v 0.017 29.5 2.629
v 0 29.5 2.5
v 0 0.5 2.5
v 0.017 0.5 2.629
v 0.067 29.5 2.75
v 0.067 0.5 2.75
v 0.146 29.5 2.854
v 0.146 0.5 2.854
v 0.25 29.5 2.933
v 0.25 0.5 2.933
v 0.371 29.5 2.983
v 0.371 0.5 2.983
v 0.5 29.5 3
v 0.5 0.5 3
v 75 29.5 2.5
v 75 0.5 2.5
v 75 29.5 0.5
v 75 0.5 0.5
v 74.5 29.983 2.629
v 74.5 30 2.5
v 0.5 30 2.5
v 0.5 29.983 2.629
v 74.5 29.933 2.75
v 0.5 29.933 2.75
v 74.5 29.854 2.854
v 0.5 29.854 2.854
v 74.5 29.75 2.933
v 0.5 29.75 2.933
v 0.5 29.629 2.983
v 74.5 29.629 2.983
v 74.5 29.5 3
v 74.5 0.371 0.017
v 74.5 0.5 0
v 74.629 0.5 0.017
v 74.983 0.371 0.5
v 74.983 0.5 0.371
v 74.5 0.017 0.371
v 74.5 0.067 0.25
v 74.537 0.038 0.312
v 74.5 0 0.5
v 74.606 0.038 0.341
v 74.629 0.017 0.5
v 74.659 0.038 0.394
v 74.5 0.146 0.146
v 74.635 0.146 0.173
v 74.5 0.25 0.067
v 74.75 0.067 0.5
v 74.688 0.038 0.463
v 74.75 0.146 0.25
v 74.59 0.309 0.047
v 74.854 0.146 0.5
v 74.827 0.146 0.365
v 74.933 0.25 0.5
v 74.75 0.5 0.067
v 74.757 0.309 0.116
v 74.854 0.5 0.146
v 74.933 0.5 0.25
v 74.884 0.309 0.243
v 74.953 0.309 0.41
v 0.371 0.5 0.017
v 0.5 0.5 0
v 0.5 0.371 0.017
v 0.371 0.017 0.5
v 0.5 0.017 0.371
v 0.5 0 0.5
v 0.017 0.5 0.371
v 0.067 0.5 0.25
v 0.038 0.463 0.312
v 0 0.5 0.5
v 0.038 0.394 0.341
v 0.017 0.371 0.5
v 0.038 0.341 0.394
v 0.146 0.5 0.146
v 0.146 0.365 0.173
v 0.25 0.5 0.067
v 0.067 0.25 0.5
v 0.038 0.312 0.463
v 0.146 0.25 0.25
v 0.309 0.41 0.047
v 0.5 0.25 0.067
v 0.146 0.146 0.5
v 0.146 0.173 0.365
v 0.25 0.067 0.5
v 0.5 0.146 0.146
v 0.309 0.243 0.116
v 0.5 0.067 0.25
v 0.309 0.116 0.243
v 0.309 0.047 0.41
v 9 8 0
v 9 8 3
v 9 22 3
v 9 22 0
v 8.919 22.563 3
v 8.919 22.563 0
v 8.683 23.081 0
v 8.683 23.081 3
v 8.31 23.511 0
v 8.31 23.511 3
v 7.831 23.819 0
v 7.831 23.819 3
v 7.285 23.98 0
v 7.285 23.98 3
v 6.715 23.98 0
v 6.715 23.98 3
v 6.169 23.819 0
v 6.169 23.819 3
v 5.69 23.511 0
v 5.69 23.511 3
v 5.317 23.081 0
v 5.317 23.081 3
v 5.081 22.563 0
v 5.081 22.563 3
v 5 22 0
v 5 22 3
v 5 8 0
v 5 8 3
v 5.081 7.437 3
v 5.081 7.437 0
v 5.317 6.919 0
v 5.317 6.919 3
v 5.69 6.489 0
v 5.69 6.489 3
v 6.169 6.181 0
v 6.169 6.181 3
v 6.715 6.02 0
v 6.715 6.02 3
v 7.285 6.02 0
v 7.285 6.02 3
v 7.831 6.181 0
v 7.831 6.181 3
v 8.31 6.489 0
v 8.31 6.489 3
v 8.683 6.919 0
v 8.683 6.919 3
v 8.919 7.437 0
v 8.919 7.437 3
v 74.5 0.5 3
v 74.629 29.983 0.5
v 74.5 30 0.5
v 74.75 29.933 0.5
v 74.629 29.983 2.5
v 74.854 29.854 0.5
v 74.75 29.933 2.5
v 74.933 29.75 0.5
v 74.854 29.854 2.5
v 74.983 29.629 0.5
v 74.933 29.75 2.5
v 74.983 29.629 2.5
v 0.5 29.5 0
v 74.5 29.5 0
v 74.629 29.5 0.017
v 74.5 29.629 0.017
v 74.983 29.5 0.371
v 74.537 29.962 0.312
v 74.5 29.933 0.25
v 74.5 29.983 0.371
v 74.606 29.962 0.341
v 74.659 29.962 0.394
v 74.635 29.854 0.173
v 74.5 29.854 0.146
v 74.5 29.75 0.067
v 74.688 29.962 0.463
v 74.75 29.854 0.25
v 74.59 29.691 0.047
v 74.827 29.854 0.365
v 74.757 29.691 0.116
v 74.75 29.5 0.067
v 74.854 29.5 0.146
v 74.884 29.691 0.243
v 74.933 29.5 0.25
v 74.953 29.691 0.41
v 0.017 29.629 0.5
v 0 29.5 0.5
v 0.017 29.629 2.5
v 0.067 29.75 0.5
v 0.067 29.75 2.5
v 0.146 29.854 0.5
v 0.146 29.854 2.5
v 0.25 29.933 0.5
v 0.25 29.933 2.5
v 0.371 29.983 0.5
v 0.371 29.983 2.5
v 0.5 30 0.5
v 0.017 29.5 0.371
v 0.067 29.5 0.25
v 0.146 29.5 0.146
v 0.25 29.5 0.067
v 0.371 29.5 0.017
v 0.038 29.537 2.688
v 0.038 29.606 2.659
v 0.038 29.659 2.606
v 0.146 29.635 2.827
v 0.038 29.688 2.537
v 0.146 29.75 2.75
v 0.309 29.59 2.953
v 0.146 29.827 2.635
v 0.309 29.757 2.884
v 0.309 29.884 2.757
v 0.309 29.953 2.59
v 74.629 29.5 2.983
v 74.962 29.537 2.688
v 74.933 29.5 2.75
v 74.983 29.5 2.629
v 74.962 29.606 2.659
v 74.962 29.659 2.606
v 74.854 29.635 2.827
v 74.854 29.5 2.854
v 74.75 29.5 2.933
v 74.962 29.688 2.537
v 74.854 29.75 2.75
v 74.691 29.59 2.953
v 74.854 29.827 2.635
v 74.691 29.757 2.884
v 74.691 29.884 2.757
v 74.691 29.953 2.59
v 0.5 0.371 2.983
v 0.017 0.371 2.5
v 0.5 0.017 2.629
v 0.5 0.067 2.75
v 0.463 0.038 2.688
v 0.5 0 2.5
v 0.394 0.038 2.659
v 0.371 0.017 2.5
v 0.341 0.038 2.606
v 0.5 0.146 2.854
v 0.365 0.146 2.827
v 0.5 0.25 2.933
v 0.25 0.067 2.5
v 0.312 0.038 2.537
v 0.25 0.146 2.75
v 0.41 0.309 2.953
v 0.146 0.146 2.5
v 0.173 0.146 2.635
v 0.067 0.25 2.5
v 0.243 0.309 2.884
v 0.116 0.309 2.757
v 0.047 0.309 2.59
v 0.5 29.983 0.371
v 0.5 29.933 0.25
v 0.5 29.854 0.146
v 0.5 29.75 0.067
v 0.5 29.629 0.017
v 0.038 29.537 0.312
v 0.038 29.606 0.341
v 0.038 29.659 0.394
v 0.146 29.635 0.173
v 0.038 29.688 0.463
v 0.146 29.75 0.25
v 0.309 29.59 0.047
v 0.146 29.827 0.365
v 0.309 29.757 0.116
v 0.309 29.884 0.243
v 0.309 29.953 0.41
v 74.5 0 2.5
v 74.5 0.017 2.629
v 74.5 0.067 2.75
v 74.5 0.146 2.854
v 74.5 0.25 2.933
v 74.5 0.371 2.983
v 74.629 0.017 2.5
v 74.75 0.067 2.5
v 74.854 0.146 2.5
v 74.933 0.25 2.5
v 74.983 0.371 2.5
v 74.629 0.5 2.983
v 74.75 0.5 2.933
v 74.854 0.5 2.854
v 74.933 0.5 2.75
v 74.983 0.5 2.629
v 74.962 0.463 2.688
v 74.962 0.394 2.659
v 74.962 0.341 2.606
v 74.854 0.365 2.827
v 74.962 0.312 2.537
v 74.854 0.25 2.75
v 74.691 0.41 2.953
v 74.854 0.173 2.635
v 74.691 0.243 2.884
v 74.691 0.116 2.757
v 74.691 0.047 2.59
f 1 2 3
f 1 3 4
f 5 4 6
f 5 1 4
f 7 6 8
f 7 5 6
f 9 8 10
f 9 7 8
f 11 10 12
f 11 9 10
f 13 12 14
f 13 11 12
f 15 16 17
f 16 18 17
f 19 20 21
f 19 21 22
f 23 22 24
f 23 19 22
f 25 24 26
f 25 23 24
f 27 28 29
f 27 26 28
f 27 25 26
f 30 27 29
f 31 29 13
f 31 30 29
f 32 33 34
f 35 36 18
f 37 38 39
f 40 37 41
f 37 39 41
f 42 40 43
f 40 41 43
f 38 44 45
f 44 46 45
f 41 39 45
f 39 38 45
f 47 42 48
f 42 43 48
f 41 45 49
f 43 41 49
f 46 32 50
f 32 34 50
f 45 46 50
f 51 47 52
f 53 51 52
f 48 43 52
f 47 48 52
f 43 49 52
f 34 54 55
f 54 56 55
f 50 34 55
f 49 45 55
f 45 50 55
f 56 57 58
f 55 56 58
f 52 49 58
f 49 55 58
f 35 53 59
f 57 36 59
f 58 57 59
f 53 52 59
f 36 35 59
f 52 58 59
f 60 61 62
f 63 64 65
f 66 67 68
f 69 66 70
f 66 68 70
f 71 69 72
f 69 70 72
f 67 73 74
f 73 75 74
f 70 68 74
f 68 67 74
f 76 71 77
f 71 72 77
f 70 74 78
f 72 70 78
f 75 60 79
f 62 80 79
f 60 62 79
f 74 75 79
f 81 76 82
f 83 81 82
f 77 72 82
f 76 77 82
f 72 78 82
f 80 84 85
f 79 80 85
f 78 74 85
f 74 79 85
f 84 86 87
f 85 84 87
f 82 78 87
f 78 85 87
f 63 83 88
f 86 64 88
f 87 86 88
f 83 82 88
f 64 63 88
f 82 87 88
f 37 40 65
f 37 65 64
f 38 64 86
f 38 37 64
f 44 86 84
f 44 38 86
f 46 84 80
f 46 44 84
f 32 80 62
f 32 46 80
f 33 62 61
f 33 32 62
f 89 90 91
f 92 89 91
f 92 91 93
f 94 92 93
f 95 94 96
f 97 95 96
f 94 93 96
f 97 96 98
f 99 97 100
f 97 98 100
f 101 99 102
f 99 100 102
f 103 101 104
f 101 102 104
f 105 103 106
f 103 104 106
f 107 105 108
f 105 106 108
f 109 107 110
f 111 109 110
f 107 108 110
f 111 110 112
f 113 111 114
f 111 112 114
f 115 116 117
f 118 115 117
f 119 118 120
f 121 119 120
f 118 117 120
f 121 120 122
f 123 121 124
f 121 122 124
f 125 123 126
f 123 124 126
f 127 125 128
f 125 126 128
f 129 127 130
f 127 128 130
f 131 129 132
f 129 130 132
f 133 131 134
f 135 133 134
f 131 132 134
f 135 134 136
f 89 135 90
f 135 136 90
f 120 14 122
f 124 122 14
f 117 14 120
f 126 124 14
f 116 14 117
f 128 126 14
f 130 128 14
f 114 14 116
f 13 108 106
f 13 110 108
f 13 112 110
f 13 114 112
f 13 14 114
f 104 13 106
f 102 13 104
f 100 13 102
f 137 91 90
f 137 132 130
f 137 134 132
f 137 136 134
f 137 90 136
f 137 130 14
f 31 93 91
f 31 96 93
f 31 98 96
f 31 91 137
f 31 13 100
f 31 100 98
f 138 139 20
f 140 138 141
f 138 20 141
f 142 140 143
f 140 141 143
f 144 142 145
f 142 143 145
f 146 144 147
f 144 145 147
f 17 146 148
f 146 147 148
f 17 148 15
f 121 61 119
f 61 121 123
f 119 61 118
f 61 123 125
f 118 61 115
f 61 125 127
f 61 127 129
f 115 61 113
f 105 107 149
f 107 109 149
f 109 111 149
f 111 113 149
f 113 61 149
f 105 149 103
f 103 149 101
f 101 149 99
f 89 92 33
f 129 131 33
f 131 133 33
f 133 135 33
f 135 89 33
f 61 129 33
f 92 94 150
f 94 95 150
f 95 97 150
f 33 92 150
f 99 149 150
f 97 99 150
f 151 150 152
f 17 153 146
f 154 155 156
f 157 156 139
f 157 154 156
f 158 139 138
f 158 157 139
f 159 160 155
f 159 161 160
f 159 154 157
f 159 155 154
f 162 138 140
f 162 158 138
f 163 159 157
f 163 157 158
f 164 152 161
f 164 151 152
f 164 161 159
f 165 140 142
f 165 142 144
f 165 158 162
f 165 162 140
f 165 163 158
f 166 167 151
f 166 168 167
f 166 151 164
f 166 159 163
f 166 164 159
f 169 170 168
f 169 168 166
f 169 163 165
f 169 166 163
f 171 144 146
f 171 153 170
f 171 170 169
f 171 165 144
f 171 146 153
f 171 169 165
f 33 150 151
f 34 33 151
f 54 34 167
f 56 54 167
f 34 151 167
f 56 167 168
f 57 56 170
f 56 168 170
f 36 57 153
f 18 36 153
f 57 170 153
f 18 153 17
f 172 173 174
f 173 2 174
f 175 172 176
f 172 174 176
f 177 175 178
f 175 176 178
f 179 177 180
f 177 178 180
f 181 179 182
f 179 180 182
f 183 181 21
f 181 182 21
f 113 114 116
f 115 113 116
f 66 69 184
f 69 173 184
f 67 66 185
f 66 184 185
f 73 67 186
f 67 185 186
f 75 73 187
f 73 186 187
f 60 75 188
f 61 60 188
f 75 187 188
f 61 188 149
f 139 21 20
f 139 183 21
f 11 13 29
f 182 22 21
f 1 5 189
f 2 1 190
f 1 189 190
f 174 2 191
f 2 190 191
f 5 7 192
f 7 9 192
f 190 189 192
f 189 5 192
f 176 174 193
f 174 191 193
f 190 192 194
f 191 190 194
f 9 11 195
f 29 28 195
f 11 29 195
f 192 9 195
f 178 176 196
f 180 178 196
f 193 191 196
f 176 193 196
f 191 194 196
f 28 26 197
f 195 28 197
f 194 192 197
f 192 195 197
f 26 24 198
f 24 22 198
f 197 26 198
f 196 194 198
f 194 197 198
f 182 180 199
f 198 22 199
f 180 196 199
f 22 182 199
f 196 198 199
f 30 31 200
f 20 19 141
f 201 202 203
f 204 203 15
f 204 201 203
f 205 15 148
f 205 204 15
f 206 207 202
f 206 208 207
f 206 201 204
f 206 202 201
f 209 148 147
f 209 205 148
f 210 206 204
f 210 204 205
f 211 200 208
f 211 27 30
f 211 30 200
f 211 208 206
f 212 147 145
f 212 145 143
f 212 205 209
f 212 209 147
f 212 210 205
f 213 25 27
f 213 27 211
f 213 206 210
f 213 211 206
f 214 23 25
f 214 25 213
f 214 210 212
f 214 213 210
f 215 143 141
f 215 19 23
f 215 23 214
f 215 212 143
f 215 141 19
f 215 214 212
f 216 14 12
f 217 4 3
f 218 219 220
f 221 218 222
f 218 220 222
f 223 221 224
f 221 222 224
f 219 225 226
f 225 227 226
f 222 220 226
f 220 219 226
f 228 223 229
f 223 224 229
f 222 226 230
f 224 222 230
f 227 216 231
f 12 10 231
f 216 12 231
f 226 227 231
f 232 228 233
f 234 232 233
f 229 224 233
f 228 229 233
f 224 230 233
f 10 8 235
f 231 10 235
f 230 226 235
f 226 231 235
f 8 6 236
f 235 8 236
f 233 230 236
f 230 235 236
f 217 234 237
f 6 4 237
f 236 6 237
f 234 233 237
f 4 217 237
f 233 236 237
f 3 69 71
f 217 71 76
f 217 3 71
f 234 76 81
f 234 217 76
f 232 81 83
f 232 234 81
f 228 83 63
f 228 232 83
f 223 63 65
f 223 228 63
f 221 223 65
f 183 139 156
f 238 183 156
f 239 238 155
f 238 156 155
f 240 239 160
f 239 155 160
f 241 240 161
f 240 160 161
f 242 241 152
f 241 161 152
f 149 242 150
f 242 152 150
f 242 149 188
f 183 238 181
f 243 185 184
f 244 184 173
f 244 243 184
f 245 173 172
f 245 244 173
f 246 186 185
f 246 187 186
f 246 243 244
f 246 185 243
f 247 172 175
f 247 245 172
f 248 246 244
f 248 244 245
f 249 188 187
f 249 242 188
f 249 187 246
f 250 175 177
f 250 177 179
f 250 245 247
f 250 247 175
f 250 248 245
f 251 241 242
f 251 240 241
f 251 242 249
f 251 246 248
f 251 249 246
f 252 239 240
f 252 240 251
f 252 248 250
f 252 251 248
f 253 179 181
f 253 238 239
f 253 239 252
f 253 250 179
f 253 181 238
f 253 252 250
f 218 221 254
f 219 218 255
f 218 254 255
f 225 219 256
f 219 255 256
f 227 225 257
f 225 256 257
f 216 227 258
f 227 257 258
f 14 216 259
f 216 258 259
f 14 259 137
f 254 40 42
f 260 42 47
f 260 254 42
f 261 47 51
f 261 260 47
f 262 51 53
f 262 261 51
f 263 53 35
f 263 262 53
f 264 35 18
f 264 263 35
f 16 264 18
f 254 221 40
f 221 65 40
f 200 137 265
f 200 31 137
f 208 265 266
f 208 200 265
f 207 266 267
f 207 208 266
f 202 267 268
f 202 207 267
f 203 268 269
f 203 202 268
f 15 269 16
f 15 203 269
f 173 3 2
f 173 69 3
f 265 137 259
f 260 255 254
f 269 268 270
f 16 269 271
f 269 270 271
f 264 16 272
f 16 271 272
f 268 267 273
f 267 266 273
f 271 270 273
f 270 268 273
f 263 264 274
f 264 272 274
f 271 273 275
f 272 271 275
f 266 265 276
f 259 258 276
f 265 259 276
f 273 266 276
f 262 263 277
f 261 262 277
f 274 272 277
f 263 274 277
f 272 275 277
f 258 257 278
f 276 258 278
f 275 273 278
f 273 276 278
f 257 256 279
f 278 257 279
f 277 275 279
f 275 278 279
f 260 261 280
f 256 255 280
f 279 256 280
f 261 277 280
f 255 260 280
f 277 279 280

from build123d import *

# Parameters (mm, degrees)
F0_W     = 75
F0_H     = 30
F1_DEPTH = 3
F2_W     = 4
F2_H     = 7
F3_DEPTH = 25
F4_R     = 0.5


with BuildPart() as f1:
    # F0 (on Top) → F1 (new body)
    with BuildSketch(Plane.XY):
        with Locations((37.5, 15)):
            Rectangle(F0_W, F0_H)
    extrude(amount=F1_DEPTH)

    # F2 (on face) → F3 (cut)
    with BuildSketch(Plane.XY.offset(3)):
        with BuildLine():
            Line((5, 22), (5, 15))
            Line((5, 15), (9, 15))
            Line((9, 15), (9, 22))
            ThreePointArc((9, 22), (7, 24), (5, 22))
        make_face()
        with Locations((7, 11.5)):
            Rectangle(F2_W, F2_H)
        with BuildLine():
            Line((9, 8), (5, 8))
            ThreePointArc((5, 8), (7, 6), (9, 8))
        make_face()
    extrude(amount=-F3_DEPTH, mode=Mode.SUBTRACT)

    # F4
    f4_edges = [f1.edges().sort_by_distance(p)[0] for p in [
        (37.5, 30, 3),
        (0, 15, 3),
        (37.5, 0, 3),
        (75, 15, 3),
        (75, 15, 0),
        (37.5, 0, 0),
        (37.5, 30, 0),
        (0, 15, 0),
        (75, 0, 1.5),
        (75, 30, 1.5),
        (0, 30, 1.5),
        (0, 0, 1.5),
    ]]
    fillet(f4_edges, radius=F4_R)


solid = f1.part
